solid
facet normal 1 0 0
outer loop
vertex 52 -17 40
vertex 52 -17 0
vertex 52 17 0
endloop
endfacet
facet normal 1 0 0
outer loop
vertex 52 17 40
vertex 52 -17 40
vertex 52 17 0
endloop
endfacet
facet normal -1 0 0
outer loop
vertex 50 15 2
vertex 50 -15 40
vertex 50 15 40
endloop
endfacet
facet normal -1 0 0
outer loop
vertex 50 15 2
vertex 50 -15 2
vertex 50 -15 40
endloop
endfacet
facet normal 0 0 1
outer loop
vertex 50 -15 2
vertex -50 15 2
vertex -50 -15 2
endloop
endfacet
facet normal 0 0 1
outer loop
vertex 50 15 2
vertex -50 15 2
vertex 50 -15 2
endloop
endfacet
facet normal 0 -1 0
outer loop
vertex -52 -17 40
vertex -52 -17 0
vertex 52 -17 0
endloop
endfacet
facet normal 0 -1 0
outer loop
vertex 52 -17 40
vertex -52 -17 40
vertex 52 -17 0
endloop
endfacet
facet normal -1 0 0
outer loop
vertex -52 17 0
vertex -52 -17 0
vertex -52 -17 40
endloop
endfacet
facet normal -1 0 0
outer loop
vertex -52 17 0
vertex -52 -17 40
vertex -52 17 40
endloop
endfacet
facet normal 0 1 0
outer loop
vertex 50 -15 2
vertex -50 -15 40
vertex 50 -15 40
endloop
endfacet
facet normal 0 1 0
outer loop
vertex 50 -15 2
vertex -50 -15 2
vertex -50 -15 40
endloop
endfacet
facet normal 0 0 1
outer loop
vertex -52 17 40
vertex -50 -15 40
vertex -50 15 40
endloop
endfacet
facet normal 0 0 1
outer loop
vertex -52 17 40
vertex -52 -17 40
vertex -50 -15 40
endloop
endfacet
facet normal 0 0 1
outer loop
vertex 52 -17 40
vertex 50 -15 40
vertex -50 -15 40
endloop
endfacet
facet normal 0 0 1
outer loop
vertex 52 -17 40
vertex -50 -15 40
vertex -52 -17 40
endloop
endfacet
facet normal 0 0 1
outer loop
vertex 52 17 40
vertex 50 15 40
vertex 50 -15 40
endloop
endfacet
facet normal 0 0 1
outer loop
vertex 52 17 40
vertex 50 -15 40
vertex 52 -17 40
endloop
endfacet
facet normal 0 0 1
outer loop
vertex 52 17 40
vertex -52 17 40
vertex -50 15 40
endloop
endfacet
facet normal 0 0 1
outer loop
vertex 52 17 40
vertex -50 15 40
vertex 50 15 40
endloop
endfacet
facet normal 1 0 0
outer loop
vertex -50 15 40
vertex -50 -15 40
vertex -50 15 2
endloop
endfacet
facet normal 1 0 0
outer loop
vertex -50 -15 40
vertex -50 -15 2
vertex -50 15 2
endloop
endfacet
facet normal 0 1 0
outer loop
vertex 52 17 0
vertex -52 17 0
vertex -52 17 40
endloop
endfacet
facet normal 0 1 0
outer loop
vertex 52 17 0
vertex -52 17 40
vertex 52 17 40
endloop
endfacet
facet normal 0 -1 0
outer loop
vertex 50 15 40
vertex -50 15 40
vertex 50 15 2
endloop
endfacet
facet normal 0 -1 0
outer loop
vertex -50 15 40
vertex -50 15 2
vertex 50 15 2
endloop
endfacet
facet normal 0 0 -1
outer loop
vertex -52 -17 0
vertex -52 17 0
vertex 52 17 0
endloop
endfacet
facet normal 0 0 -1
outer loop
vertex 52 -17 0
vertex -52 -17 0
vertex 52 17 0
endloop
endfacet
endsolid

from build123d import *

# Parameters (mm, degrees)
SKETCH_W    = 104
SKETCH_H    = 34
PAD_DEPTH   = 40
THICKNESS_T = -2


with BuildPart() as part:
    # Sketch → Pad (new body)
    with BuildSketch(Plane.XY):
        Rectangle(SKETCH_W, SKETCH_H)
    extrude(amount=PAD_DEPTH)

    # Thickness
    thickness_openings = [part.faces().sort_by_distance(p)[0] for p in [
        (0, 0, 40),
    ]]
    offset(amount=THICKNESS_T, openings=thickness_openings)


solid = part.part
